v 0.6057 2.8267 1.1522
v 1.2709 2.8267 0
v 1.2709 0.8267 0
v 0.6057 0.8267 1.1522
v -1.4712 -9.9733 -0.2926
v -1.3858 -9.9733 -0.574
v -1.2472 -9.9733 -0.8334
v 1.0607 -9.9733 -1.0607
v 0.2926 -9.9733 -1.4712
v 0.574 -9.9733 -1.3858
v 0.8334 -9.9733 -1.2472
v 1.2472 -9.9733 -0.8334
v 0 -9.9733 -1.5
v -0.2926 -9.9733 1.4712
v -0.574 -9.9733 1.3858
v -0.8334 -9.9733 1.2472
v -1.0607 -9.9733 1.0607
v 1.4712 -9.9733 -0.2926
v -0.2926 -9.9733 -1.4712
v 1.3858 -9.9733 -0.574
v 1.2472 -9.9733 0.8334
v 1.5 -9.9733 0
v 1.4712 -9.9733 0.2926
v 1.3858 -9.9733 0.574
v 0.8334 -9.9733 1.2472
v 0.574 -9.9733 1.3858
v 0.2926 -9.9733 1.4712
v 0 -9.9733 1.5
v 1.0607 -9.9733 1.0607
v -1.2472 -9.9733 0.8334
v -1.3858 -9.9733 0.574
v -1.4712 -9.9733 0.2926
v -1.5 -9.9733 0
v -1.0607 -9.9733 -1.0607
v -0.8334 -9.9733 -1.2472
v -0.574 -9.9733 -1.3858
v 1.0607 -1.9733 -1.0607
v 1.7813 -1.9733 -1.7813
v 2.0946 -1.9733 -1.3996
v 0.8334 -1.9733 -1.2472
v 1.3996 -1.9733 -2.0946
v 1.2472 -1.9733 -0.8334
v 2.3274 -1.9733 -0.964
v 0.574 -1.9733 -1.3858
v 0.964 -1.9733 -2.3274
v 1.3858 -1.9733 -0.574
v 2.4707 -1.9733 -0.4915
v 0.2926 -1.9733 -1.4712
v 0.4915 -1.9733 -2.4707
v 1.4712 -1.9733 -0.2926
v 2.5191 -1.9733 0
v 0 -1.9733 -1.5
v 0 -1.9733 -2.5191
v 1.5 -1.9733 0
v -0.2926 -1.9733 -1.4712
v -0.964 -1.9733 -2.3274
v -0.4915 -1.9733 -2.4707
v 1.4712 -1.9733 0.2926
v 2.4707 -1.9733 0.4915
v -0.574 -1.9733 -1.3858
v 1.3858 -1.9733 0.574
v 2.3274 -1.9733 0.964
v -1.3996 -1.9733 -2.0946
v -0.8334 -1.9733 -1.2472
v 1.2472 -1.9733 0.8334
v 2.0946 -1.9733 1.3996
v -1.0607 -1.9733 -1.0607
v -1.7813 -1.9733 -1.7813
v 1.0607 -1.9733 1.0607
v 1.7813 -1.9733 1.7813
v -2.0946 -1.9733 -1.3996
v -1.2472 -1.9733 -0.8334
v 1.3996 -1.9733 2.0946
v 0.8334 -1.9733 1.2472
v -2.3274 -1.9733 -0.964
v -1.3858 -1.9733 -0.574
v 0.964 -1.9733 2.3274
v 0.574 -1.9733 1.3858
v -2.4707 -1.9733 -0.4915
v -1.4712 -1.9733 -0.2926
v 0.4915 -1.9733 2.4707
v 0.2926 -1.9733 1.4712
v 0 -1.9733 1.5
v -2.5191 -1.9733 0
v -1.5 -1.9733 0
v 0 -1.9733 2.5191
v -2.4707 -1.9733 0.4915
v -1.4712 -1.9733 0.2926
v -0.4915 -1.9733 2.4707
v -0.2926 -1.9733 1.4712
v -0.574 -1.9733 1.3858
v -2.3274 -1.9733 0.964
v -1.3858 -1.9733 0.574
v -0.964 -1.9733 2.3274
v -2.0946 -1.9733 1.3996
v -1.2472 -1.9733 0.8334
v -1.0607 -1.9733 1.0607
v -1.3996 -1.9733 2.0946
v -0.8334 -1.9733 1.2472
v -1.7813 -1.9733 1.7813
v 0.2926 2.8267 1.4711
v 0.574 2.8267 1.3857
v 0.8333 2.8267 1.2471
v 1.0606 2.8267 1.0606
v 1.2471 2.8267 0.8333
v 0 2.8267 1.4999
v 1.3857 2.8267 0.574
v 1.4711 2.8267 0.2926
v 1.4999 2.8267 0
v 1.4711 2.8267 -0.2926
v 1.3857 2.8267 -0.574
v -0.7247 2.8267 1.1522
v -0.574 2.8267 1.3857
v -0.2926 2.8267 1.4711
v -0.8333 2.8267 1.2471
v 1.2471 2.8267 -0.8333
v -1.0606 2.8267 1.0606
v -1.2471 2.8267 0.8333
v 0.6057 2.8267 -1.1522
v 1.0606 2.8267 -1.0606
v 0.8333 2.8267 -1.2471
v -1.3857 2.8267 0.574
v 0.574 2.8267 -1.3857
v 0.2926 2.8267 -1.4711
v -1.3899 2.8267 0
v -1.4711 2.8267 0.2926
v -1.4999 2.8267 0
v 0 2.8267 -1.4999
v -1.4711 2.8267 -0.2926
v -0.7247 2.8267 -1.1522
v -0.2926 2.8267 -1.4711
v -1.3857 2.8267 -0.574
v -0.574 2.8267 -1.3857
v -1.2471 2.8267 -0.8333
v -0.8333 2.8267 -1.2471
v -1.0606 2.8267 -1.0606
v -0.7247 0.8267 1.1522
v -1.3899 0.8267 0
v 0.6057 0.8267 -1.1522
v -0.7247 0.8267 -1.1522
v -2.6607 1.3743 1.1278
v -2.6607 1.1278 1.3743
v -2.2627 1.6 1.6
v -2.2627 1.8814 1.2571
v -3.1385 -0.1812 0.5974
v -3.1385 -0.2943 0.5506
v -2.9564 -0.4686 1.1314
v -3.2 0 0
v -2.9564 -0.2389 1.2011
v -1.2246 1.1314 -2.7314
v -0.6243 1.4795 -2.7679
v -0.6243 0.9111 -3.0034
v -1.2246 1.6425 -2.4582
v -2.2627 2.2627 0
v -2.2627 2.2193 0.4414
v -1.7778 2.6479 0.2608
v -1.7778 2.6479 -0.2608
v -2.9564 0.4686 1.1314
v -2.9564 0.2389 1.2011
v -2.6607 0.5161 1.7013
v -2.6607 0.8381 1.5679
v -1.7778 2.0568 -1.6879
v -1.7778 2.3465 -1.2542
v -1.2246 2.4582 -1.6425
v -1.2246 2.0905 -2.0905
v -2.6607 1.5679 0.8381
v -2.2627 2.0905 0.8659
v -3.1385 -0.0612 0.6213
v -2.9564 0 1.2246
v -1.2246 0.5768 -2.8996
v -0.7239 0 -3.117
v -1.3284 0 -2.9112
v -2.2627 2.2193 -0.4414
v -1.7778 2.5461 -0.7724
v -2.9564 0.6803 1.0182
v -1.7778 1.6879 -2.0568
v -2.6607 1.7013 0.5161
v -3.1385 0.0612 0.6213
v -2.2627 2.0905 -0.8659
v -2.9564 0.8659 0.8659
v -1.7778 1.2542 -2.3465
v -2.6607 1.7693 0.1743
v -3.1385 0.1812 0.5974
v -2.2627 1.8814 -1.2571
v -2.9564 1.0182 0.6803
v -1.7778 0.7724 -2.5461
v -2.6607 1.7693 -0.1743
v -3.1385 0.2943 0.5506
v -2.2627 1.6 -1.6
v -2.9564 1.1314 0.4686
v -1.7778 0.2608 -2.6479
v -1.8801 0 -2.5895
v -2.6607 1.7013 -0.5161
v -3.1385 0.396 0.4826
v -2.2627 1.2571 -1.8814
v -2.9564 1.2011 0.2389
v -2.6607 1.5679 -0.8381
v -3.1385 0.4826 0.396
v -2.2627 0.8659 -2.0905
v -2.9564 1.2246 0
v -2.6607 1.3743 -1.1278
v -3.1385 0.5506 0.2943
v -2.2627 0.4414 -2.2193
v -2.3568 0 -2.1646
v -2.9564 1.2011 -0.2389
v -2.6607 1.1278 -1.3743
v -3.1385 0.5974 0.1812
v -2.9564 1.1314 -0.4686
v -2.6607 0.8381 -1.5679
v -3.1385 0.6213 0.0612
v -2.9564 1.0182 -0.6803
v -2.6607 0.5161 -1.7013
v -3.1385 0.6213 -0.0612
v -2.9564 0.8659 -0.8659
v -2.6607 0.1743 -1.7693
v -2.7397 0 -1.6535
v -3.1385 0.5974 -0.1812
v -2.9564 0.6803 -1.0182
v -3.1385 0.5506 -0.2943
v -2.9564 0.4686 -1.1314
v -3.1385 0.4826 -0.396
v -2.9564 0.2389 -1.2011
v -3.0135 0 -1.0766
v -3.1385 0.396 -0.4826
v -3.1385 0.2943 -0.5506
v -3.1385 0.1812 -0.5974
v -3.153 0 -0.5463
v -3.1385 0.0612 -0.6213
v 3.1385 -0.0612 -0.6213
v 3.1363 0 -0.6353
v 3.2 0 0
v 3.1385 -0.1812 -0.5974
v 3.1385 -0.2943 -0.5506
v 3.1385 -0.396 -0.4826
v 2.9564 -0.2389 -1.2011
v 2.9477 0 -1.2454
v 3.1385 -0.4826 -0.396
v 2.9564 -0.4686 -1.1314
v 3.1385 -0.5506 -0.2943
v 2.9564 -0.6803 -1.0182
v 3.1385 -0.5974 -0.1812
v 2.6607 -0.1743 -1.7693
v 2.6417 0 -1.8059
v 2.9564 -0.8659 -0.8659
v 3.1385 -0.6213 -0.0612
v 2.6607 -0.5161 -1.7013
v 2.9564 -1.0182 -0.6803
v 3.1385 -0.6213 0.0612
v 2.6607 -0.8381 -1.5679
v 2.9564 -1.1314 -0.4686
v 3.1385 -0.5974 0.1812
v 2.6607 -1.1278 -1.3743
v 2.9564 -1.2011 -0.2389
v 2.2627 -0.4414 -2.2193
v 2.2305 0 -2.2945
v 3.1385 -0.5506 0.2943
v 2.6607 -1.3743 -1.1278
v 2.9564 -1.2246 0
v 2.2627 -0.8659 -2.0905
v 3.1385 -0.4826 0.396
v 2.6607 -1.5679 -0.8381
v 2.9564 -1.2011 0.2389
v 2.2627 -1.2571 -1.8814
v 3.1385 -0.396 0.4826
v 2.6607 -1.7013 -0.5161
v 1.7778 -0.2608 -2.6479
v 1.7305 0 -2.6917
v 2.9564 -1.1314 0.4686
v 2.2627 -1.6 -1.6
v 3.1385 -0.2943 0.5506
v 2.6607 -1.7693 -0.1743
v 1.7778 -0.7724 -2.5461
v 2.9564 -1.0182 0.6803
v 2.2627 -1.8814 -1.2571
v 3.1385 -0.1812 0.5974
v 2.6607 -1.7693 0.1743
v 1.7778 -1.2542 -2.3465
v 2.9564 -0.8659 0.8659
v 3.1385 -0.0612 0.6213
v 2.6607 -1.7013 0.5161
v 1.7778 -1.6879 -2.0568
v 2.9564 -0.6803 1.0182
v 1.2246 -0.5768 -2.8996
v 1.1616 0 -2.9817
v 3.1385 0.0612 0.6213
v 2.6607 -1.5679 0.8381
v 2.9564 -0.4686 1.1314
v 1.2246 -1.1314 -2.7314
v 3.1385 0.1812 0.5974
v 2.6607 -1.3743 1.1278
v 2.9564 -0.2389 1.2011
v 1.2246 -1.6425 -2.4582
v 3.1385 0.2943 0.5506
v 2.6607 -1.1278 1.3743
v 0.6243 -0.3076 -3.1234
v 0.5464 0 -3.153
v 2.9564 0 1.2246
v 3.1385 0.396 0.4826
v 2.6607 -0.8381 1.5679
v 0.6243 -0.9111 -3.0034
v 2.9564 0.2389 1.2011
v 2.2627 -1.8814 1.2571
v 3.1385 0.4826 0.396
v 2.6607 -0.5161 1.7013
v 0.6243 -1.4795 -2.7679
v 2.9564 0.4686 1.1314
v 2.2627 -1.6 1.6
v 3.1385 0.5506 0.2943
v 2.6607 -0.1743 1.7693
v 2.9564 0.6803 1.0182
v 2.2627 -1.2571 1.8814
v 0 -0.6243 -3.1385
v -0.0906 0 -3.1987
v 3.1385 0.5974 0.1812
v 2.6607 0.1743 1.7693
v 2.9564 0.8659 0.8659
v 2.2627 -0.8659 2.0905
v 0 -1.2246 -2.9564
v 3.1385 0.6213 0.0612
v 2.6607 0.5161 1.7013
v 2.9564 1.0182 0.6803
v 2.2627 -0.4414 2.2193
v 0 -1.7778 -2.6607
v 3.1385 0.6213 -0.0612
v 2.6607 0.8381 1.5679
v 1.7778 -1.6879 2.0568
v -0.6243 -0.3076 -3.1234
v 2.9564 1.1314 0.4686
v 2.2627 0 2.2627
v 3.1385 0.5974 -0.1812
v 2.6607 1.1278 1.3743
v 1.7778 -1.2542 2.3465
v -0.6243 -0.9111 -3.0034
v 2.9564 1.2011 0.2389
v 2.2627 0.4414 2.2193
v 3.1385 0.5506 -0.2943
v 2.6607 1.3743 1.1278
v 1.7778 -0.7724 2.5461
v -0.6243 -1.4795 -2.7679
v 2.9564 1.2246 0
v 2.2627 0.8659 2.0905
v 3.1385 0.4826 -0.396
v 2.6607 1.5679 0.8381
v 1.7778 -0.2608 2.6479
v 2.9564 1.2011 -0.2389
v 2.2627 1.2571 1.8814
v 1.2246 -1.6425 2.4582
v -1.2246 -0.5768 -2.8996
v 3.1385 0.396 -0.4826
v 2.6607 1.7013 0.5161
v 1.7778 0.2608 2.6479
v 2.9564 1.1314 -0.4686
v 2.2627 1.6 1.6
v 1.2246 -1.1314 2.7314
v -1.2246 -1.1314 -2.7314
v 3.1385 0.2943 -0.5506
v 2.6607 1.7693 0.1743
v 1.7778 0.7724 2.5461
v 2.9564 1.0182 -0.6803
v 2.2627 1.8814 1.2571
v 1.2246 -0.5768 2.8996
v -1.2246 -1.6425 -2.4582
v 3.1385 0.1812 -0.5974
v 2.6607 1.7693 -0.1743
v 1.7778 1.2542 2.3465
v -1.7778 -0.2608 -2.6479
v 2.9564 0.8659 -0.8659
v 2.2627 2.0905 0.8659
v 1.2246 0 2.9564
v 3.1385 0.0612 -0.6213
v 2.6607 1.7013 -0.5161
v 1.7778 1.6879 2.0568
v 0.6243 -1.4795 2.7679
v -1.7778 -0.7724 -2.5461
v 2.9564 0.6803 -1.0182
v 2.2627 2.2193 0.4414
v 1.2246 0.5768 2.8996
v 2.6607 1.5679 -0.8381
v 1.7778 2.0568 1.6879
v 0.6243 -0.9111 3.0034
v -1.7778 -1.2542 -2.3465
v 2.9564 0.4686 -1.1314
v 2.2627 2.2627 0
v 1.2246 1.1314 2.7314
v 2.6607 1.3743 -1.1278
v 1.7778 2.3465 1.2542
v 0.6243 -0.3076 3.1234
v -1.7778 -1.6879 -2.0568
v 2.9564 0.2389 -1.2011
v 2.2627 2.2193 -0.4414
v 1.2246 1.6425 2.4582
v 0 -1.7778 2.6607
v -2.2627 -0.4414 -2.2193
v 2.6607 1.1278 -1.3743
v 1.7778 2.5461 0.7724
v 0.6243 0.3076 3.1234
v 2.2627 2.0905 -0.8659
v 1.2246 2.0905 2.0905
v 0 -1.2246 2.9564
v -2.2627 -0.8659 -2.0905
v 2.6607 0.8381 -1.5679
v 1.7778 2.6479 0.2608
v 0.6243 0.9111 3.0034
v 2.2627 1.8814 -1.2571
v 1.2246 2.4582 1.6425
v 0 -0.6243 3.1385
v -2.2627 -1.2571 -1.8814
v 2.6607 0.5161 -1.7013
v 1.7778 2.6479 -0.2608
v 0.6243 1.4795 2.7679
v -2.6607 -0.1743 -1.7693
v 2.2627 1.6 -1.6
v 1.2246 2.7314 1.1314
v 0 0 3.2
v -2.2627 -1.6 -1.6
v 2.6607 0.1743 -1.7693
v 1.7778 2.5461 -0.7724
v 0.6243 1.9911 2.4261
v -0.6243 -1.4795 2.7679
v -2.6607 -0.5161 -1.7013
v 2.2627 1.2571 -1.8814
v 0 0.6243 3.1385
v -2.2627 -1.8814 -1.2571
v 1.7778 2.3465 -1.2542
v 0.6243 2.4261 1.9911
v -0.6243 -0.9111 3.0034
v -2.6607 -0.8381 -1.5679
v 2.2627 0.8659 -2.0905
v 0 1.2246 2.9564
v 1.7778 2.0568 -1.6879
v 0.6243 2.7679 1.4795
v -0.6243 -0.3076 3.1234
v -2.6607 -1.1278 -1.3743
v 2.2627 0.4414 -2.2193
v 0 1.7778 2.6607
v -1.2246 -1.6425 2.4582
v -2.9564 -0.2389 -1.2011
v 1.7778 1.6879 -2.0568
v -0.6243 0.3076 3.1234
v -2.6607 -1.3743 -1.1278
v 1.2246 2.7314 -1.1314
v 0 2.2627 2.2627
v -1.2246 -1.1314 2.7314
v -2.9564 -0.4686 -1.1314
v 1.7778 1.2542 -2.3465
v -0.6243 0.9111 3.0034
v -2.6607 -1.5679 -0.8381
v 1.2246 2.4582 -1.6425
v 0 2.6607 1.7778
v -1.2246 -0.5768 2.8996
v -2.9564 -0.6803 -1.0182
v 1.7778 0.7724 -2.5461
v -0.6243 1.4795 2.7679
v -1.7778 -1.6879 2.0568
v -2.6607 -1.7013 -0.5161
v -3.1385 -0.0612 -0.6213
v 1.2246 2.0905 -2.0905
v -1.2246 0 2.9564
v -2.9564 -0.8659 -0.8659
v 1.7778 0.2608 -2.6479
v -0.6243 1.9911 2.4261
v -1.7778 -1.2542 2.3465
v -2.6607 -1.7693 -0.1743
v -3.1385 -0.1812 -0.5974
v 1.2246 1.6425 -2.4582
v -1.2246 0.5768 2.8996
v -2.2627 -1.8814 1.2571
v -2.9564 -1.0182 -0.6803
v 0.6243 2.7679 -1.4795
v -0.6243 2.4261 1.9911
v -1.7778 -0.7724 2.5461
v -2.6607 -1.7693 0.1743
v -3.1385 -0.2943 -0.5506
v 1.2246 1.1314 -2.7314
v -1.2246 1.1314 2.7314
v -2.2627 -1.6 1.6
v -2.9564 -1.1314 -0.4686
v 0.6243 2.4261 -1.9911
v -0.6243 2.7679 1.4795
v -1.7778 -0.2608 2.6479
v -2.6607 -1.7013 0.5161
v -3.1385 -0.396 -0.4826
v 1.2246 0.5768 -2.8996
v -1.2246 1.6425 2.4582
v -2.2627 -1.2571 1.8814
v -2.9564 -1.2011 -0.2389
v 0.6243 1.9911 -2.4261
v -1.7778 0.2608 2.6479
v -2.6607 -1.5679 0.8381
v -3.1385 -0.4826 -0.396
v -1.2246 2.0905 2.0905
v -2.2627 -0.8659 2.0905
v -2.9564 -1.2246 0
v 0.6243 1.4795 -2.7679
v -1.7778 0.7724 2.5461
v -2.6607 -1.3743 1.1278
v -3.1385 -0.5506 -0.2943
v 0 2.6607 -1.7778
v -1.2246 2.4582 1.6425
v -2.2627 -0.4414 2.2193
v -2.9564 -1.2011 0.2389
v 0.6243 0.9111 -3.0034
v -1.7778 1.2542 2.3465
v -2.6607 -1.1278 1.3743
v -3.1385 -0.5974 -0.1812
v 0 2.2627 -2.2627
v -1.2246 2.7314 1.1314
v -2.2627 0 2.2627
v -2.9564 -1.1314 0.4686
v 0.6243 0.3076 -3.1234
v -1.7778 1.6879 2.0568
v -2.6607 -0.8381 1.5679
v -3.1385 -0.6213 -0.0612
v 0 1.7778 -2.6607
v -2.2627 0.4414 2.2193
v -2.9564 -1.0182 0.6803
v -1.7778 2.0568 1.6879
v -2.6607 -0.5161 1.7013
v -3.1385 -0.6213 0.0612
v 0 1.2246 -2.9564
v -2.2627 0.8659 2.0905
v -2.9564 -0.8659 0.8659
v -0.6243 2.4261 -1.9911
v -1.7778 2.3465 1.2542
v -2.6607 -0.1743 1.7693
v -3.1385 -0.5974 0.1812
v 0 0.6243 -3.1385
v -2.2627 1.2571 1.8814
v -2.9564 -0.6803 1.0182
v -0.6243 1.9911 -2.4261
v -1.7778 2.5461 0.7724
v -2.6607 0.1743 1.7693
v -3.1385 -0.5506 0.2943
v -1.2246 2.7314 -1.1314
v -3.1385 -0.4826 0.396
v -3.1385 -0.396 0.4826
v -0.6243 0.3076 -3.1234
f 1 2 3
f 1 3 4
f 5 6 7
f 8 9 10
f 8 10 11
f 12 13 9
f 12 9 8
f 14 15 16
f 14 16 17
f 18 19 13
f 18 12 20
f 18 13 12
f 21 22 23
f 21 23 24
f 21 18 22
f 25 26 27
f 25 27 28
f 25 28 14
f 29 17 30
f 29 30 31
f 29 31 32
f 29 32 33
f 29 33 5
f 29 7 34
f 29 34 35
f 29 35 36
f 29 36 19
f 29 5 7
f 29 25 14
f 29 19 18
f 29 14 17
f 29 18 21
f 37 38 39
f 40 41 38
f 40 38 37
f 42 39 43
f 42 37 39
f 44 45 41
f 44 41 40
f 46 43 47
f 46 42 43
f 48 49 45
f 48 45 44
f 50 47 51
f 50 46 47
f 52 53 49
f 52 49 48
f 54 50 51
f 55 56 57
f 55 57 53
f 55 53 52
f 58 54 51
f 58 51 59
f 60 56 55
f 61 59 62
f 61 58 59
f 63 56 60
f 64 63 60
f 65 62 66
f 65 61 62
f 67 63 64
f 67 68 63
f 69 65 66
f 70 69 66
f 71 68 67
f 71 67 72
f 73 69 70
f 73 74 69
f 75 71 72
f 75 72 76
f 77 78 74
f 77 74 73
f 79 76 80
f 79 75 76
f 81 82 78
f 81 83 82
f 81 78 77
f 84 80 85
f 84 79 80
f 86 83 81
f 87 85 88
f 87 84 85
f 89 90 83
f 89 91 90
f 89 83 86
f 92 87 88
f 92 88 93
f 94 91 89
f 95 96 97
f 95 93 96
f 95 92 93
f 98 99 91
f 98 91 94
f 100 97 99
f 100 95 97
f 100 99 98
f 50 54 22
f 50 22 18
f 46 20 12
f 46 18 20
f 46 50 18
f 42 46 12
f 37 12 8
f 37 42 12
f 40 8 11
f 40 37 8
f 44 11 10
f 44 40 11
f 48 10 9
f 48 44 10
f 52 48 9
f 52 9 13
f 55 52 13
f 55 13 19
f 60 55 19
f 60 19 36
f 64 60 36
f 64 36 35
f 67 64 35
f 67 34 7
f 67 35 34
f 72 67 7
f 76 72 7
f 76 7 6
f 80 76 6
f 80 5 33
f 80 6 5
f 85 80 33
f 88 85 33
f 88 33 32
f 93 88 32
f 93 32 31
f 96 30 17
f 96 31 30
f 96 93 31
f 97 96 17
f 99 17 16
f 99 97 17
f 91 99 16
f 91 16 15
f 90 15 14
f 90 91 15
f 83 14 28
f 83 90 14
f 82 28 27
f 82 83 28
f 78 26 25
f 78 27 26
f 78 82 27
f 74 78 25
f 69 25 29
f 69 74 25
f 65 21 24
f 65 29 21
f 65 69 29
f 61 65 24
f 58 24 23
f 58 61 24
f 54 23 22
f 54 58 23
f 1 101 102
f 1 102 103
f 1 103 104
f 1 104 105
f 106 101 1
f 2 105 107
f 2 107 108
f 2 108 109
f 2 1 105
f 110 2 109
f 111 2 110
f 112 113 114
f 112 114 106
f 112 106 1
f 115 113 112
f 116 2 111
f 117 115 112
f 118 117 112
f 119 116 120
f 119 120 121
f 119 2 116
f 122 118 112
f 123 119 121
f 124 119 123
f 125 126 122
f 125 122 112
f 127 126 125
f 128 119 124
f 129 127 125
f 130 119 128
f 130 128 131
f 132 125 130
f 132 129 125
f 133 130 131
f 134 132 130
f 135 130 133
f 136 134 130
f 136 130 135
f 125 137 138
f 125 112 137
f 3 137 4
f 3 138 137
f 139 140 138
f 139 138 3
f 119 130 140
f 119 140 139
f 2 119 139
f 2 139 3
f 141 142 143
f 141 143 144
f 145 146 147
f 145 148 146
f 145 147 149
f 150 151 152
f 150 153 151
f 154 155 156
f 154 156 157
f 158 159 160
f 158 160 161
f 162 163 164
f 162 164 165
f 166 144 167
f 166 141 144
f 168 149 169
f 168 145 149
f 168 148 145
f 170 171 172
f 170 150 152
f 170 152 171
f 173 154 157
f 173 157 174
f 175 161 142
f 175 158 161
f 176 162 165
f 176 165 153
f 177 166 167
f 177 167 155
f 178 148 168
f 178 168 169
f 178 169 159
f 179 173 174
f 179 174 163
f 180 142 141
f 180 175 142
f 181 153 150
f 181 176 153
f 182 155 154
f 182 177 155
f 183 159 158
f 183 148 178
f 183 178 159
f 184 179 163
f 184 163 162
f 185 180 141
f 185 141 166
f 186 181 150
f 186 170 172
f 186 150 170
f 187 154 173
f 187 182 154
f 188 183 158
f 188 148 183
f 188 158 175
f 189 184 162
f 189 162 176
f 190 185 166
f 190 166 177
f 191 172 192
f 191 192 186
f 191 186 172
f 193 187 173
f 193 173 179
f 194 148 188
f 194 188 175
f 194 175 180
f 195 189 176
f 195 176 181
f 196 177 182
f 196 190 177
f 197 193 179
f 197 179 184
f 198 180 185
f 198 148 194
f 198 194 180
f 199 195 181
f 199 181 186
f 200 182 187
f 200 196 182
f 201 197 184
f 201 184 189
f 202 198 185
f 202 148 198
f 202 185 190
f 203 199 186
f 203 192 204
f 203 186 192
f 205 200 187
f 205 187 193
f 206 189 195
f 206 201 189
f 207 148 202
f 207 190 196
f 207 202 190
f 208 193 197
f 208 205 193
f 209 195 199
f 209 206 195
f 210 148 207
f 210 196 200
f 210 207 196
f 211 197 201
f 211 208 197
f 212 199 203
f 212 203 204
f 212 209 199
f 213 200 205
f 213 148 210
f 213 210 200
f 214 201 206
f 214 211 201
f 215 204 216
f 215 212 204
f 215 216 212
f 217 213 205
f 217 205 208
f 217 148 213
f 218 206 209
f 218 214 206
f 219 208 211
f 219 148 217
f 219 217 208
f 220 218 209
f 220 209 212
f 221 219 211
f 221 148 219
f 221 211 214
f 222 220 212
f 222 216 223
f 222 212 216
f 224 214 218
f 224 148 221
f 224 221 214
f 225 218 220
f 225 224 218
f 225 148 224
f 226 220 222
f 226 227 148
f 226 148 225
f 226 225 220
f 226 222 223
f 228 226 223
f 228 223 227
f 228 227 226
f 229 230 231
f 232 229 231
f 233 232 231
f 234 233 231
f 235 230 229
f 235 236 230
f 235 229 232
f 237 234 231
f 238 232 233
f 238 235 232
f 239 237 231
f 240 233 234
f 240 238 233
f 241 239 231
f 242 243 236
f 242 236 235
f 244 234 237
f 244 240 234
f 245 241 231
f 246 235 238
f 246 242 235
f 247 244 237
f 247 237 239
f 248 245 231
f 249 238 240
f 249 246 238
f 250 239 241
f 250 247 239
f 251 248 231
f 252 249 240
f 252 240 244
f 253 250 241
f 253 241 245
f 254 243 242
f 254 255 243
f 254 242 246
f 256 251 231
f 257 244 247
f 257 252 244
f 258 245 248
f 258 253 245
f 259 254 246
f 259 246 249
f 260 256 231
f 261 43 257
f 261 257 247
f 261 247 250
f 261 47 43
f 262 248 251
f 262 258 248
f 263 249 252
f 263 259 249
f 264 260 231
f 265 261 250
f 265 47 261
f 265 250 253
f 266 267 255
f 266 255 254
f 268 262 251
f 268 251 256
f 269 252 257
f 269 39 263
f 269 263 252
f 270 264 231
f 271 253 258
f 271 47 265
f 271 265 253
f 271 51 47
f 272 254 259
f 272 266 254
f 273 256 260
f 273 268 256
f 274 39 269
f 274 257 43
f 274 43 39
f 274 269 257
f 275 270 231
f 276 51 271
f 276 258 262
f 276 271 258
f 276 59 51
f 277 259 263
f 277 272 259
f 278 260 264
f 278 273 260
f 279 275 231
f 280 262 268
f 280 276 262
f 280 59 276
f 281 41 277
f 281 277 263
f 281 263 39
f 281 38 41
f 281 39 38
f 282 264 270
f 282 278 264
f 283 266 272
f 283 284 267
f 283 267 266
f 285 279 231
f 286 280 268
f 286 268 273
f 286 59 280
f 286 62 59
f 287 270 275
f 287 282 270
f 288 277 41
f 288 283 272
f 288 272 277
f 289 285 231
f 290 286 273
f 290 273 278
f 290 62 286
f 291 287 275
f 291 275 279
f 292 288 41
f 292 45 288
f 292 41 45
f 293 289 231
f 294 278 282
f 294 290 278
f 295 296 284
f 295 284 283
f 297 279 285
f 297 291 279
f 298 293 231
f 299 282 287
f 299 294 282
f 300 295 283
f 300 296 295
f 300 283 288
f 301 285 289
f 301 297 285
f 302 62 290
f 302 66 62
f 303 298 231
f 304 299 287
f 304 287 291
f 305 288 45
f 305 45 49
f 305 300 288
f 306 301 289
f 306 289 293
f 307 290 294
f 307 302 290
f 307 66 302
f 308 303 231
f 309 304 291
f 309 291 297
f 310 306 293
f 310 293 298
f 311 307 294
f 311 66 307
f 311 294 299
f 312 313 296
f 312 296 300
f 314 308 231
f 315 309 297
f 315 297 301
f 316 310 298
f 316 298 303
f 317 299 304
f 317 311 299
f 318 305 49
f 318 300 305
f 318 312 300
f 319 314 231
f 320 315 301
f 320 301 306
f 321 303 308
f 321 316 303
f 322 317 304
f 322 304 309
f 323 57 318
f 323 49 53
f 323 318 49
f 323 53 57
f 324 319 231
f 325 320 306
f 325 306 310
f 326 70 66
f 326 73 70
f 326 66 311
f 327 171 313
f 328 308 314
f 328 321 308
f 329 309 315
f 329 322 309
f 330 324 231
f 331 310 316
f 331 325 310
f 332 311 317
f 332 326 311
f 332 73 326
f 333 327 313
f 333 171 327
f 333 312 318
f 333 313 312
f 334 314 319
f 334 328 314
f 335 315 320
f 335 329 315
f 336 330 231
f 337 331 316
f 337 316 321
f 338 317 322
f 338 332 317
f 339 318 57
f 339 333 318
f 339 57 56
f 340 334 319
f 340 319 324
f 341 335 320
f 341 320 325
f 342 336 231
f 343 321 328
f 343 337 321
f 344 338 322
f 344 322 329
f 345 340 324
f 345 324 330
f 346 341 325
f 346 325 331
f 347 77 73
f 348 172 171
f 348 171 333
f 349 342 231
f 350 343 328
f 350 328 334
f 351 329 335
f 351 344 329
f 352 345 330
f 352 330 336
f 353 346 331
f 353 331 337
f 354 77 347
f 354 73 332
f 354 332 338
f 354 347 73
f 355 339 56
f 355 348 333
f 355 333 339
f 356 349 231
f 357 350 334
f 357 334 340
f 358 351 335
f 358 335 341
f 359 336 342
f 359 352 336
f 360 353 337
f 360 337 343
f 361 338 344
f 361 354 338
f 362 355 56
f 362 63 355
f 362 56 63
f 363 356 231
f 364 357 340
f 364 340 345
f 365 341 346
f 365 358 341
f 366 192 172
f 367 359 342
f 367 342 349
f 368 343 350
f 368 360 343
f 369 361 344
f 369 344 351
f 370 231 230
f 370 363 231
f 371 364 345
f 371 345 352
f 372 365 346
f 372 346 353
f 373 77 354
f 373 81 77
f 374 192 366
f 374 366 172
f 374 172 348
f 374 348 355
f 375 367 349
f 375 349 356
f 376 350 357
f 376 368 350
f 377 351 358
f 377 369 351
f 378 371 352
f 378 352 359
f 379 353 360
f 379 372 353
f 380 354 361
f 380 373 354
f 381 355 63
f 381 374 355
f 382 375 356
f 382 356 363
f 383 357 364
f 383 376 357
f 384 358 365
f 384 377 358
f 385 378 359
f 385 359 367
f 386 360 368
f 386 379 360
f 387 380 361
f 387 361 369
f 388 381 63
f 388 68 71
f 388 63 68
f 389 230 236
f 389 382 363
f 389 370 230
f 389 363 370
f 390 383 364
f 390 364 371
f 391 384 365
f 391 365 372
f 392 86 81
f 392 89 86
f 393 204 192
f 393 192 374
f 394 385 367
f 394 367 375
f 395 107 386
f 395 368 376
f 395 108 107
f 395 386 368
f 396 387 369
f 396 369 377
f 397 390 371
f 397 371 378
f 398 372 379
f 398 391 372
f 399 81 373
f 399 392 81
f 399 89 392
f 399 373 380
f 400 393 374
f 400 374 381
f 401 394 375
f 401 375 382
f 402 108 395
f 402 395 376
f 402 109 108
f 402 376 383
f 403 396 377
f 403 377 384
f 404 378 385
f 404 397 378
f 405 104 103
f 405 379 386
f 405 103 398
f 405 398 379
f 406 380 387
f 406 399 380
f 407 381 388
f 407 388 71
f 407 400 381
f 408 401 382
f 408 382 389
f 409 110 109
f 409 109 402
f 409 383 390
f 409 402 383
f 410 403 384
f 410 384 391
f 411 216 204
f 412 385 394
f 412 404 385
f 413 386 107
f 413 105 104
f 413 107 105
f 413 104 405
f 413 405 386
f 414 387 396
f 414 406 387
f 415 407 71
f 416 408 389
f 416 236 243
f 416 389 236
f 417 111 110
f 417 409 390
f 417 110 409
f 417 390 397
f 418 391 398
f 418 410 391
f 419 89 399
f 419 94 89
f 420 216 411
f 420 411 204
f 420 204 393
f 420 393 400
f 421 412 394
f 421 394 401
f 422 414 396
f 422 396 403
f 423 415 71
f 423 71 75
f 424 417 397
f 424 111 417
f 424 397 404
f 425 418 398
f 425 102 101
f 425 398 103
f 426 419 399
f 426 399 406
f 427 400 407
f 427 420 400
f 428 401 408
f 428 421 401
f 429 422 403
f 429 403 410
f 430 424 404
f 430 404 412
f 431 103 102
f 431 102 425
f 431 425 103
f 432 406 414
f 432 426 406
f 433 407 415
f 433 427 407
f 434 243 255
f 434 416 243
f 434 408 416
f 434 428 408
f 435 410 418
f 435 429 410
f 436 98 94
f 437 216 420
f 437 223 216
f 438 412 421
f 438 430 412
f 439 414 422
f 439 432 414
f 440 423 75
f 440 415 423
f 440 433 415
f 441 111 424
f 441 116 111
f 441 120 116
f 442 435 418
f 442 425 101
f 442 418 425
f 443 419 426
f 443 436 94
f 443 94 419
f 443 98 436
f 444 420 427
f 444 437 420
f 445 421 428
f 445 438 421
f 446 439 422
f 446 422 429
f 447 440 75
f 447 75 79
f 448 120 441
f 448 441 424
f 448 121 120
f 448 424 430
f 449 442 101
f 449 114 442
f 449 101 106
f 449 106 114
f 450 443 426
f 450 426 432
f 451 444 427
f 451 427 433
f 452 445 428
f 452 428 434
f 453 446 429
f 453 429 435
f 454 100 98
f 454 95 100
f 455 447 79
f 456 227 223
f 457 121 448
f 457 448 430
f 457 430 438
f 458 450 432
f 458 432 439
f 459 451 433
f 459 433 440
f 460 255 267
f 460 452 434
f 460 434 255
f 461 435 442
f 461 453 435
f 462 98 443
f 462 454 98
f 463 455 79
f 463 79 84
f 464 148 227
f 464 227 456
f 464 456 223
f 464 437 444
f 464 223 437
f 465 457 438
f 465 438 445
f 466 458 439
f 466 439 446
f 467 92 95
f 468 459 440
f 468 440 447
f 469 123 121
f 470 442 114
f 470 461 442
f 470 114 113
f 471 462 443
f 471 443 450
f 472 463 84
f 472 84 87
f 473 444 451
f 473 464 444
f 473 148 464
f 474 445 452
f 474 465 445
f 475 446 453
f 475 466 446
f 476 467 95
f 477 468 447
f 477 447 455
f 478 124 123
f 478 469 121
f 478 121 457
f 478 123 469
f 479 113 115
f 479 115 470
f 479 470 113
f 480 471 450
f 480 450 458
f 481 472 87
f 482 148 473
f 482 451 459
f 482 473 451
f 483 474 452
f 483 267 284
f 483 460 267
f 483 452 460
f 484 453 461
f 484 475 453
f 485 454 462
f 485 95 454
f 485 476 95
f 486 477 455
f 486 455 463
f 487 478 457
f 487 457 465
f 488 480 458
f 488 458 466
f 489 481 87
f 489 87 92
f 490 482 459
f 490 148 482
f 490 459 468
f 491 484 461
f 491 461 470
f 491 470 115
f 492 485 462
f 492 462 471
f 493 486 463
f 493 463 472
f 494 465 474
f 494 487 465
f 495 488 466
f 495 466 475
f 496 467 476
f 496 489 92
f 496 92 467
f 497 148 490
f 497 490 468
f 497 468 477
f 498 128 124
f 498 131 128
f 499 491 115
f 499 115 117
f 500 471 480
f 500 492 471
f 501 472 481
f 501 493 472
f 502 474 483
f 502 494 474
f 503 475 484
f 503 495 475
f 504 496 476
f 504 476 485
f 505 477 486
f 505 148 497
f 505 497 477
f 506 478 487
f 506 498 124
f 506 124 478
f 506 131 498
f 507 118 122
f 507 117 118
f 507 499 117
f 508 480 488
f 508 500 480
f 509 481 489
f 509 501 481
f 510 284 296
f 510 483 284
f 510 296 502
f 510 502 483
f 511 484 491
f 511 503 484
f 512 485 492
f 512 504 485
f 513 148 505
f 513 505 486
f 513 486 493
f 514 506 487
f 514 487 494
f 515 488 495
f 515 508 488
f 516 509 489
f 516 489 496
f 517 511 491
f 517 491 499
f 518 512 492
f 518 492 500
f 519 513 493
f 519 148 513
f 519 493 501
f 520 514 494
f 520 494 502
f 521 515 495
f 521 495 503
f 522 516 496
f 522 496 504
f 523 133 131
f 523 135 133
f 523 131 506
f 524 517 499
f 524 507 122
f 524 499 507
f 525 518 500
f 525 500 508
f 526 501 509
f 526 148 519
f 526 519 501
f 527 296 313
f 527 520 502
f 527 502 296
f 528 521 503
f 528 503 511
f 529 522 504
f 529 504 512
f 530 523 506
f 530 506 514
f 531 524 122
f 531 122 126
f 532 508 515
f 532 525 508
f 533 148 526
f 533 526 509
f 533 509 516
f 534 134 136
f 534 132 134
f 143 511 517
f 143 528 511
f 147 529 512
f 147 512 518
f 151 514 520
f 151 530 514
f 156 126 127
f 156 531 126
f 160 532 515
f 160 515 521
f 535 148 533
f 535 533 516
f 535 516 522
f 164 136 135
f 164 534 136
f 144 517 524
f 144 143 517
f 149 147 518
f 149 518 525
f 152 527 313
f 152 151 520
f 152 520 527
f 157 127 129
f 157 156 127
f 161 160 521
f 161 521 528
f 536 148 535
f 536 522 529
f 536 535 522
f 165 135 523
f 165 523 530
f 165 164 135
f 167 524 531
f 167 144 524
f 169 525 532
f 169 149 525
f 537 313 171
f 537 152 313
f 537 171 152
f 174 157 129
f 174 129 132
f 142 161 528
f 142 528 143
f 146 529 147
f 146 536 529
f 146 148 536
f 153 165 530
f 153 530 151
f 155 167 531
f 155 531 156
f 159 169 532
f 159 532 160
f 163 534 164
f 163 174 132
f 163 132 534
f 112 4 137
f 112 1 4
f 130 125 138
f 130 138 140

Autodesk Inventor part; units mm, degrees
ref_plane "YZ Plane" through (0, 0, 0) normal (1, 0, 0) x (0, 1, 0)
ref_plane "XZ Plane" through (0, 0, 0) normal (0, 1, 0) x (-1, 0, 0)
ref_plane "XY Plane" through (0, 0, 0) normal (0, 0, 1) x (1, 0, 0)
sketch "Sketch1" plane through (0, 0, 0) normal (0, 1, 0) x (-1, 0, 0)
  circle A0 centre (0, 0) radius 3.2
  line L0 (3.2, 0) -> (-3.2, 0)
  dimension "d0" = 6.4
revolve "Revolution1" add sketch "Sketch1" angle 360 about axis through (-3.2, 0, 0) along (1, 0, 0) picked at (1.0667, -1.9947) contours A0 L0
sketch "Sketch2" plane through (0, 0, 0) normal (1, 0, 0) x (0, 1, 0)
  line L0 (-1.9733, 5.6826) -> (-7.2021, 5.6826)
  line L1 (-7.2021, 5.6826) -> (-7.2021, -6.4165)
  line L2 (-7.2021, -6.4165) -> (-1.9733, -6.4165)
  line L3 (-1.9733, -6.4165) -> (-1.9733, 5.6826)
  line L4 (5.3731, 6.6744) -> (2.8267, 6.6744)
  line L5 (2.8267, 6.6744) -> (2.8267, -5.9008)
  line L6 (2.8267, -5.9008) -> (5.3731, -5.9008)
  line L7 (5.3731, -5.9008) -> (5.3731, 6.6744)
  circle A0 centre (0, 0) radius 3.2 projected
  point P0 (2.8267, -1.5)
  point P1 (2.8267, 1.5)
  dimension "d2" = 4.8
  dimension "d8" = 3
extrude "Extrusion1" cut sketch "Sketch2" along normal mid plane 10 contours L3 A0 L2 L1 L0 | L3 A0 | A0 L5 | L5 L4 L7 L6 A0
sketch "Sketch3" plane through (0, -1.9733, 0) normal (0, -1, 0) x (1, 0, 0)
  circle A0 centre (0, 0) radius 2.5191 projected
  circle A1 centre (0, 0) radius 1.5
  dimension "d5" = 3
extrude "Extrusion2" add sketch "Sketch3" along normal blind 8 contours A1
thread "Thread1" size "M3x0.5" class "6g" standard "ANSI Metric M Profile" full length
sketch "Sketch4" plane through (0, 2.8267, 0) normal (0, 1, 0) x (1, 0, 0)
  line L0 (-1.3899, 0) -> (-0.7247, 1.1522)
  line L1 (-0.7247, 1.1522) -> (0.6057, 1.1522)
  line L2 (0.6057, 1.1522) -> (1.2709, 0)
  line L3 (1.2709, 0) -> (0.6057, -1.1522)
  line L4 (0.6057, -1.1522) -> (-0.7247, -1.1522)
  line L5 (-0.7247, -1.1522) -> (-1.3899, 0)
  point P0 (-0.0595, 0)
extrude "Extrusion3" cut sketch "Sketch4" against normal blind 2
properties part number "500-113" material "Aluminum 6061"
